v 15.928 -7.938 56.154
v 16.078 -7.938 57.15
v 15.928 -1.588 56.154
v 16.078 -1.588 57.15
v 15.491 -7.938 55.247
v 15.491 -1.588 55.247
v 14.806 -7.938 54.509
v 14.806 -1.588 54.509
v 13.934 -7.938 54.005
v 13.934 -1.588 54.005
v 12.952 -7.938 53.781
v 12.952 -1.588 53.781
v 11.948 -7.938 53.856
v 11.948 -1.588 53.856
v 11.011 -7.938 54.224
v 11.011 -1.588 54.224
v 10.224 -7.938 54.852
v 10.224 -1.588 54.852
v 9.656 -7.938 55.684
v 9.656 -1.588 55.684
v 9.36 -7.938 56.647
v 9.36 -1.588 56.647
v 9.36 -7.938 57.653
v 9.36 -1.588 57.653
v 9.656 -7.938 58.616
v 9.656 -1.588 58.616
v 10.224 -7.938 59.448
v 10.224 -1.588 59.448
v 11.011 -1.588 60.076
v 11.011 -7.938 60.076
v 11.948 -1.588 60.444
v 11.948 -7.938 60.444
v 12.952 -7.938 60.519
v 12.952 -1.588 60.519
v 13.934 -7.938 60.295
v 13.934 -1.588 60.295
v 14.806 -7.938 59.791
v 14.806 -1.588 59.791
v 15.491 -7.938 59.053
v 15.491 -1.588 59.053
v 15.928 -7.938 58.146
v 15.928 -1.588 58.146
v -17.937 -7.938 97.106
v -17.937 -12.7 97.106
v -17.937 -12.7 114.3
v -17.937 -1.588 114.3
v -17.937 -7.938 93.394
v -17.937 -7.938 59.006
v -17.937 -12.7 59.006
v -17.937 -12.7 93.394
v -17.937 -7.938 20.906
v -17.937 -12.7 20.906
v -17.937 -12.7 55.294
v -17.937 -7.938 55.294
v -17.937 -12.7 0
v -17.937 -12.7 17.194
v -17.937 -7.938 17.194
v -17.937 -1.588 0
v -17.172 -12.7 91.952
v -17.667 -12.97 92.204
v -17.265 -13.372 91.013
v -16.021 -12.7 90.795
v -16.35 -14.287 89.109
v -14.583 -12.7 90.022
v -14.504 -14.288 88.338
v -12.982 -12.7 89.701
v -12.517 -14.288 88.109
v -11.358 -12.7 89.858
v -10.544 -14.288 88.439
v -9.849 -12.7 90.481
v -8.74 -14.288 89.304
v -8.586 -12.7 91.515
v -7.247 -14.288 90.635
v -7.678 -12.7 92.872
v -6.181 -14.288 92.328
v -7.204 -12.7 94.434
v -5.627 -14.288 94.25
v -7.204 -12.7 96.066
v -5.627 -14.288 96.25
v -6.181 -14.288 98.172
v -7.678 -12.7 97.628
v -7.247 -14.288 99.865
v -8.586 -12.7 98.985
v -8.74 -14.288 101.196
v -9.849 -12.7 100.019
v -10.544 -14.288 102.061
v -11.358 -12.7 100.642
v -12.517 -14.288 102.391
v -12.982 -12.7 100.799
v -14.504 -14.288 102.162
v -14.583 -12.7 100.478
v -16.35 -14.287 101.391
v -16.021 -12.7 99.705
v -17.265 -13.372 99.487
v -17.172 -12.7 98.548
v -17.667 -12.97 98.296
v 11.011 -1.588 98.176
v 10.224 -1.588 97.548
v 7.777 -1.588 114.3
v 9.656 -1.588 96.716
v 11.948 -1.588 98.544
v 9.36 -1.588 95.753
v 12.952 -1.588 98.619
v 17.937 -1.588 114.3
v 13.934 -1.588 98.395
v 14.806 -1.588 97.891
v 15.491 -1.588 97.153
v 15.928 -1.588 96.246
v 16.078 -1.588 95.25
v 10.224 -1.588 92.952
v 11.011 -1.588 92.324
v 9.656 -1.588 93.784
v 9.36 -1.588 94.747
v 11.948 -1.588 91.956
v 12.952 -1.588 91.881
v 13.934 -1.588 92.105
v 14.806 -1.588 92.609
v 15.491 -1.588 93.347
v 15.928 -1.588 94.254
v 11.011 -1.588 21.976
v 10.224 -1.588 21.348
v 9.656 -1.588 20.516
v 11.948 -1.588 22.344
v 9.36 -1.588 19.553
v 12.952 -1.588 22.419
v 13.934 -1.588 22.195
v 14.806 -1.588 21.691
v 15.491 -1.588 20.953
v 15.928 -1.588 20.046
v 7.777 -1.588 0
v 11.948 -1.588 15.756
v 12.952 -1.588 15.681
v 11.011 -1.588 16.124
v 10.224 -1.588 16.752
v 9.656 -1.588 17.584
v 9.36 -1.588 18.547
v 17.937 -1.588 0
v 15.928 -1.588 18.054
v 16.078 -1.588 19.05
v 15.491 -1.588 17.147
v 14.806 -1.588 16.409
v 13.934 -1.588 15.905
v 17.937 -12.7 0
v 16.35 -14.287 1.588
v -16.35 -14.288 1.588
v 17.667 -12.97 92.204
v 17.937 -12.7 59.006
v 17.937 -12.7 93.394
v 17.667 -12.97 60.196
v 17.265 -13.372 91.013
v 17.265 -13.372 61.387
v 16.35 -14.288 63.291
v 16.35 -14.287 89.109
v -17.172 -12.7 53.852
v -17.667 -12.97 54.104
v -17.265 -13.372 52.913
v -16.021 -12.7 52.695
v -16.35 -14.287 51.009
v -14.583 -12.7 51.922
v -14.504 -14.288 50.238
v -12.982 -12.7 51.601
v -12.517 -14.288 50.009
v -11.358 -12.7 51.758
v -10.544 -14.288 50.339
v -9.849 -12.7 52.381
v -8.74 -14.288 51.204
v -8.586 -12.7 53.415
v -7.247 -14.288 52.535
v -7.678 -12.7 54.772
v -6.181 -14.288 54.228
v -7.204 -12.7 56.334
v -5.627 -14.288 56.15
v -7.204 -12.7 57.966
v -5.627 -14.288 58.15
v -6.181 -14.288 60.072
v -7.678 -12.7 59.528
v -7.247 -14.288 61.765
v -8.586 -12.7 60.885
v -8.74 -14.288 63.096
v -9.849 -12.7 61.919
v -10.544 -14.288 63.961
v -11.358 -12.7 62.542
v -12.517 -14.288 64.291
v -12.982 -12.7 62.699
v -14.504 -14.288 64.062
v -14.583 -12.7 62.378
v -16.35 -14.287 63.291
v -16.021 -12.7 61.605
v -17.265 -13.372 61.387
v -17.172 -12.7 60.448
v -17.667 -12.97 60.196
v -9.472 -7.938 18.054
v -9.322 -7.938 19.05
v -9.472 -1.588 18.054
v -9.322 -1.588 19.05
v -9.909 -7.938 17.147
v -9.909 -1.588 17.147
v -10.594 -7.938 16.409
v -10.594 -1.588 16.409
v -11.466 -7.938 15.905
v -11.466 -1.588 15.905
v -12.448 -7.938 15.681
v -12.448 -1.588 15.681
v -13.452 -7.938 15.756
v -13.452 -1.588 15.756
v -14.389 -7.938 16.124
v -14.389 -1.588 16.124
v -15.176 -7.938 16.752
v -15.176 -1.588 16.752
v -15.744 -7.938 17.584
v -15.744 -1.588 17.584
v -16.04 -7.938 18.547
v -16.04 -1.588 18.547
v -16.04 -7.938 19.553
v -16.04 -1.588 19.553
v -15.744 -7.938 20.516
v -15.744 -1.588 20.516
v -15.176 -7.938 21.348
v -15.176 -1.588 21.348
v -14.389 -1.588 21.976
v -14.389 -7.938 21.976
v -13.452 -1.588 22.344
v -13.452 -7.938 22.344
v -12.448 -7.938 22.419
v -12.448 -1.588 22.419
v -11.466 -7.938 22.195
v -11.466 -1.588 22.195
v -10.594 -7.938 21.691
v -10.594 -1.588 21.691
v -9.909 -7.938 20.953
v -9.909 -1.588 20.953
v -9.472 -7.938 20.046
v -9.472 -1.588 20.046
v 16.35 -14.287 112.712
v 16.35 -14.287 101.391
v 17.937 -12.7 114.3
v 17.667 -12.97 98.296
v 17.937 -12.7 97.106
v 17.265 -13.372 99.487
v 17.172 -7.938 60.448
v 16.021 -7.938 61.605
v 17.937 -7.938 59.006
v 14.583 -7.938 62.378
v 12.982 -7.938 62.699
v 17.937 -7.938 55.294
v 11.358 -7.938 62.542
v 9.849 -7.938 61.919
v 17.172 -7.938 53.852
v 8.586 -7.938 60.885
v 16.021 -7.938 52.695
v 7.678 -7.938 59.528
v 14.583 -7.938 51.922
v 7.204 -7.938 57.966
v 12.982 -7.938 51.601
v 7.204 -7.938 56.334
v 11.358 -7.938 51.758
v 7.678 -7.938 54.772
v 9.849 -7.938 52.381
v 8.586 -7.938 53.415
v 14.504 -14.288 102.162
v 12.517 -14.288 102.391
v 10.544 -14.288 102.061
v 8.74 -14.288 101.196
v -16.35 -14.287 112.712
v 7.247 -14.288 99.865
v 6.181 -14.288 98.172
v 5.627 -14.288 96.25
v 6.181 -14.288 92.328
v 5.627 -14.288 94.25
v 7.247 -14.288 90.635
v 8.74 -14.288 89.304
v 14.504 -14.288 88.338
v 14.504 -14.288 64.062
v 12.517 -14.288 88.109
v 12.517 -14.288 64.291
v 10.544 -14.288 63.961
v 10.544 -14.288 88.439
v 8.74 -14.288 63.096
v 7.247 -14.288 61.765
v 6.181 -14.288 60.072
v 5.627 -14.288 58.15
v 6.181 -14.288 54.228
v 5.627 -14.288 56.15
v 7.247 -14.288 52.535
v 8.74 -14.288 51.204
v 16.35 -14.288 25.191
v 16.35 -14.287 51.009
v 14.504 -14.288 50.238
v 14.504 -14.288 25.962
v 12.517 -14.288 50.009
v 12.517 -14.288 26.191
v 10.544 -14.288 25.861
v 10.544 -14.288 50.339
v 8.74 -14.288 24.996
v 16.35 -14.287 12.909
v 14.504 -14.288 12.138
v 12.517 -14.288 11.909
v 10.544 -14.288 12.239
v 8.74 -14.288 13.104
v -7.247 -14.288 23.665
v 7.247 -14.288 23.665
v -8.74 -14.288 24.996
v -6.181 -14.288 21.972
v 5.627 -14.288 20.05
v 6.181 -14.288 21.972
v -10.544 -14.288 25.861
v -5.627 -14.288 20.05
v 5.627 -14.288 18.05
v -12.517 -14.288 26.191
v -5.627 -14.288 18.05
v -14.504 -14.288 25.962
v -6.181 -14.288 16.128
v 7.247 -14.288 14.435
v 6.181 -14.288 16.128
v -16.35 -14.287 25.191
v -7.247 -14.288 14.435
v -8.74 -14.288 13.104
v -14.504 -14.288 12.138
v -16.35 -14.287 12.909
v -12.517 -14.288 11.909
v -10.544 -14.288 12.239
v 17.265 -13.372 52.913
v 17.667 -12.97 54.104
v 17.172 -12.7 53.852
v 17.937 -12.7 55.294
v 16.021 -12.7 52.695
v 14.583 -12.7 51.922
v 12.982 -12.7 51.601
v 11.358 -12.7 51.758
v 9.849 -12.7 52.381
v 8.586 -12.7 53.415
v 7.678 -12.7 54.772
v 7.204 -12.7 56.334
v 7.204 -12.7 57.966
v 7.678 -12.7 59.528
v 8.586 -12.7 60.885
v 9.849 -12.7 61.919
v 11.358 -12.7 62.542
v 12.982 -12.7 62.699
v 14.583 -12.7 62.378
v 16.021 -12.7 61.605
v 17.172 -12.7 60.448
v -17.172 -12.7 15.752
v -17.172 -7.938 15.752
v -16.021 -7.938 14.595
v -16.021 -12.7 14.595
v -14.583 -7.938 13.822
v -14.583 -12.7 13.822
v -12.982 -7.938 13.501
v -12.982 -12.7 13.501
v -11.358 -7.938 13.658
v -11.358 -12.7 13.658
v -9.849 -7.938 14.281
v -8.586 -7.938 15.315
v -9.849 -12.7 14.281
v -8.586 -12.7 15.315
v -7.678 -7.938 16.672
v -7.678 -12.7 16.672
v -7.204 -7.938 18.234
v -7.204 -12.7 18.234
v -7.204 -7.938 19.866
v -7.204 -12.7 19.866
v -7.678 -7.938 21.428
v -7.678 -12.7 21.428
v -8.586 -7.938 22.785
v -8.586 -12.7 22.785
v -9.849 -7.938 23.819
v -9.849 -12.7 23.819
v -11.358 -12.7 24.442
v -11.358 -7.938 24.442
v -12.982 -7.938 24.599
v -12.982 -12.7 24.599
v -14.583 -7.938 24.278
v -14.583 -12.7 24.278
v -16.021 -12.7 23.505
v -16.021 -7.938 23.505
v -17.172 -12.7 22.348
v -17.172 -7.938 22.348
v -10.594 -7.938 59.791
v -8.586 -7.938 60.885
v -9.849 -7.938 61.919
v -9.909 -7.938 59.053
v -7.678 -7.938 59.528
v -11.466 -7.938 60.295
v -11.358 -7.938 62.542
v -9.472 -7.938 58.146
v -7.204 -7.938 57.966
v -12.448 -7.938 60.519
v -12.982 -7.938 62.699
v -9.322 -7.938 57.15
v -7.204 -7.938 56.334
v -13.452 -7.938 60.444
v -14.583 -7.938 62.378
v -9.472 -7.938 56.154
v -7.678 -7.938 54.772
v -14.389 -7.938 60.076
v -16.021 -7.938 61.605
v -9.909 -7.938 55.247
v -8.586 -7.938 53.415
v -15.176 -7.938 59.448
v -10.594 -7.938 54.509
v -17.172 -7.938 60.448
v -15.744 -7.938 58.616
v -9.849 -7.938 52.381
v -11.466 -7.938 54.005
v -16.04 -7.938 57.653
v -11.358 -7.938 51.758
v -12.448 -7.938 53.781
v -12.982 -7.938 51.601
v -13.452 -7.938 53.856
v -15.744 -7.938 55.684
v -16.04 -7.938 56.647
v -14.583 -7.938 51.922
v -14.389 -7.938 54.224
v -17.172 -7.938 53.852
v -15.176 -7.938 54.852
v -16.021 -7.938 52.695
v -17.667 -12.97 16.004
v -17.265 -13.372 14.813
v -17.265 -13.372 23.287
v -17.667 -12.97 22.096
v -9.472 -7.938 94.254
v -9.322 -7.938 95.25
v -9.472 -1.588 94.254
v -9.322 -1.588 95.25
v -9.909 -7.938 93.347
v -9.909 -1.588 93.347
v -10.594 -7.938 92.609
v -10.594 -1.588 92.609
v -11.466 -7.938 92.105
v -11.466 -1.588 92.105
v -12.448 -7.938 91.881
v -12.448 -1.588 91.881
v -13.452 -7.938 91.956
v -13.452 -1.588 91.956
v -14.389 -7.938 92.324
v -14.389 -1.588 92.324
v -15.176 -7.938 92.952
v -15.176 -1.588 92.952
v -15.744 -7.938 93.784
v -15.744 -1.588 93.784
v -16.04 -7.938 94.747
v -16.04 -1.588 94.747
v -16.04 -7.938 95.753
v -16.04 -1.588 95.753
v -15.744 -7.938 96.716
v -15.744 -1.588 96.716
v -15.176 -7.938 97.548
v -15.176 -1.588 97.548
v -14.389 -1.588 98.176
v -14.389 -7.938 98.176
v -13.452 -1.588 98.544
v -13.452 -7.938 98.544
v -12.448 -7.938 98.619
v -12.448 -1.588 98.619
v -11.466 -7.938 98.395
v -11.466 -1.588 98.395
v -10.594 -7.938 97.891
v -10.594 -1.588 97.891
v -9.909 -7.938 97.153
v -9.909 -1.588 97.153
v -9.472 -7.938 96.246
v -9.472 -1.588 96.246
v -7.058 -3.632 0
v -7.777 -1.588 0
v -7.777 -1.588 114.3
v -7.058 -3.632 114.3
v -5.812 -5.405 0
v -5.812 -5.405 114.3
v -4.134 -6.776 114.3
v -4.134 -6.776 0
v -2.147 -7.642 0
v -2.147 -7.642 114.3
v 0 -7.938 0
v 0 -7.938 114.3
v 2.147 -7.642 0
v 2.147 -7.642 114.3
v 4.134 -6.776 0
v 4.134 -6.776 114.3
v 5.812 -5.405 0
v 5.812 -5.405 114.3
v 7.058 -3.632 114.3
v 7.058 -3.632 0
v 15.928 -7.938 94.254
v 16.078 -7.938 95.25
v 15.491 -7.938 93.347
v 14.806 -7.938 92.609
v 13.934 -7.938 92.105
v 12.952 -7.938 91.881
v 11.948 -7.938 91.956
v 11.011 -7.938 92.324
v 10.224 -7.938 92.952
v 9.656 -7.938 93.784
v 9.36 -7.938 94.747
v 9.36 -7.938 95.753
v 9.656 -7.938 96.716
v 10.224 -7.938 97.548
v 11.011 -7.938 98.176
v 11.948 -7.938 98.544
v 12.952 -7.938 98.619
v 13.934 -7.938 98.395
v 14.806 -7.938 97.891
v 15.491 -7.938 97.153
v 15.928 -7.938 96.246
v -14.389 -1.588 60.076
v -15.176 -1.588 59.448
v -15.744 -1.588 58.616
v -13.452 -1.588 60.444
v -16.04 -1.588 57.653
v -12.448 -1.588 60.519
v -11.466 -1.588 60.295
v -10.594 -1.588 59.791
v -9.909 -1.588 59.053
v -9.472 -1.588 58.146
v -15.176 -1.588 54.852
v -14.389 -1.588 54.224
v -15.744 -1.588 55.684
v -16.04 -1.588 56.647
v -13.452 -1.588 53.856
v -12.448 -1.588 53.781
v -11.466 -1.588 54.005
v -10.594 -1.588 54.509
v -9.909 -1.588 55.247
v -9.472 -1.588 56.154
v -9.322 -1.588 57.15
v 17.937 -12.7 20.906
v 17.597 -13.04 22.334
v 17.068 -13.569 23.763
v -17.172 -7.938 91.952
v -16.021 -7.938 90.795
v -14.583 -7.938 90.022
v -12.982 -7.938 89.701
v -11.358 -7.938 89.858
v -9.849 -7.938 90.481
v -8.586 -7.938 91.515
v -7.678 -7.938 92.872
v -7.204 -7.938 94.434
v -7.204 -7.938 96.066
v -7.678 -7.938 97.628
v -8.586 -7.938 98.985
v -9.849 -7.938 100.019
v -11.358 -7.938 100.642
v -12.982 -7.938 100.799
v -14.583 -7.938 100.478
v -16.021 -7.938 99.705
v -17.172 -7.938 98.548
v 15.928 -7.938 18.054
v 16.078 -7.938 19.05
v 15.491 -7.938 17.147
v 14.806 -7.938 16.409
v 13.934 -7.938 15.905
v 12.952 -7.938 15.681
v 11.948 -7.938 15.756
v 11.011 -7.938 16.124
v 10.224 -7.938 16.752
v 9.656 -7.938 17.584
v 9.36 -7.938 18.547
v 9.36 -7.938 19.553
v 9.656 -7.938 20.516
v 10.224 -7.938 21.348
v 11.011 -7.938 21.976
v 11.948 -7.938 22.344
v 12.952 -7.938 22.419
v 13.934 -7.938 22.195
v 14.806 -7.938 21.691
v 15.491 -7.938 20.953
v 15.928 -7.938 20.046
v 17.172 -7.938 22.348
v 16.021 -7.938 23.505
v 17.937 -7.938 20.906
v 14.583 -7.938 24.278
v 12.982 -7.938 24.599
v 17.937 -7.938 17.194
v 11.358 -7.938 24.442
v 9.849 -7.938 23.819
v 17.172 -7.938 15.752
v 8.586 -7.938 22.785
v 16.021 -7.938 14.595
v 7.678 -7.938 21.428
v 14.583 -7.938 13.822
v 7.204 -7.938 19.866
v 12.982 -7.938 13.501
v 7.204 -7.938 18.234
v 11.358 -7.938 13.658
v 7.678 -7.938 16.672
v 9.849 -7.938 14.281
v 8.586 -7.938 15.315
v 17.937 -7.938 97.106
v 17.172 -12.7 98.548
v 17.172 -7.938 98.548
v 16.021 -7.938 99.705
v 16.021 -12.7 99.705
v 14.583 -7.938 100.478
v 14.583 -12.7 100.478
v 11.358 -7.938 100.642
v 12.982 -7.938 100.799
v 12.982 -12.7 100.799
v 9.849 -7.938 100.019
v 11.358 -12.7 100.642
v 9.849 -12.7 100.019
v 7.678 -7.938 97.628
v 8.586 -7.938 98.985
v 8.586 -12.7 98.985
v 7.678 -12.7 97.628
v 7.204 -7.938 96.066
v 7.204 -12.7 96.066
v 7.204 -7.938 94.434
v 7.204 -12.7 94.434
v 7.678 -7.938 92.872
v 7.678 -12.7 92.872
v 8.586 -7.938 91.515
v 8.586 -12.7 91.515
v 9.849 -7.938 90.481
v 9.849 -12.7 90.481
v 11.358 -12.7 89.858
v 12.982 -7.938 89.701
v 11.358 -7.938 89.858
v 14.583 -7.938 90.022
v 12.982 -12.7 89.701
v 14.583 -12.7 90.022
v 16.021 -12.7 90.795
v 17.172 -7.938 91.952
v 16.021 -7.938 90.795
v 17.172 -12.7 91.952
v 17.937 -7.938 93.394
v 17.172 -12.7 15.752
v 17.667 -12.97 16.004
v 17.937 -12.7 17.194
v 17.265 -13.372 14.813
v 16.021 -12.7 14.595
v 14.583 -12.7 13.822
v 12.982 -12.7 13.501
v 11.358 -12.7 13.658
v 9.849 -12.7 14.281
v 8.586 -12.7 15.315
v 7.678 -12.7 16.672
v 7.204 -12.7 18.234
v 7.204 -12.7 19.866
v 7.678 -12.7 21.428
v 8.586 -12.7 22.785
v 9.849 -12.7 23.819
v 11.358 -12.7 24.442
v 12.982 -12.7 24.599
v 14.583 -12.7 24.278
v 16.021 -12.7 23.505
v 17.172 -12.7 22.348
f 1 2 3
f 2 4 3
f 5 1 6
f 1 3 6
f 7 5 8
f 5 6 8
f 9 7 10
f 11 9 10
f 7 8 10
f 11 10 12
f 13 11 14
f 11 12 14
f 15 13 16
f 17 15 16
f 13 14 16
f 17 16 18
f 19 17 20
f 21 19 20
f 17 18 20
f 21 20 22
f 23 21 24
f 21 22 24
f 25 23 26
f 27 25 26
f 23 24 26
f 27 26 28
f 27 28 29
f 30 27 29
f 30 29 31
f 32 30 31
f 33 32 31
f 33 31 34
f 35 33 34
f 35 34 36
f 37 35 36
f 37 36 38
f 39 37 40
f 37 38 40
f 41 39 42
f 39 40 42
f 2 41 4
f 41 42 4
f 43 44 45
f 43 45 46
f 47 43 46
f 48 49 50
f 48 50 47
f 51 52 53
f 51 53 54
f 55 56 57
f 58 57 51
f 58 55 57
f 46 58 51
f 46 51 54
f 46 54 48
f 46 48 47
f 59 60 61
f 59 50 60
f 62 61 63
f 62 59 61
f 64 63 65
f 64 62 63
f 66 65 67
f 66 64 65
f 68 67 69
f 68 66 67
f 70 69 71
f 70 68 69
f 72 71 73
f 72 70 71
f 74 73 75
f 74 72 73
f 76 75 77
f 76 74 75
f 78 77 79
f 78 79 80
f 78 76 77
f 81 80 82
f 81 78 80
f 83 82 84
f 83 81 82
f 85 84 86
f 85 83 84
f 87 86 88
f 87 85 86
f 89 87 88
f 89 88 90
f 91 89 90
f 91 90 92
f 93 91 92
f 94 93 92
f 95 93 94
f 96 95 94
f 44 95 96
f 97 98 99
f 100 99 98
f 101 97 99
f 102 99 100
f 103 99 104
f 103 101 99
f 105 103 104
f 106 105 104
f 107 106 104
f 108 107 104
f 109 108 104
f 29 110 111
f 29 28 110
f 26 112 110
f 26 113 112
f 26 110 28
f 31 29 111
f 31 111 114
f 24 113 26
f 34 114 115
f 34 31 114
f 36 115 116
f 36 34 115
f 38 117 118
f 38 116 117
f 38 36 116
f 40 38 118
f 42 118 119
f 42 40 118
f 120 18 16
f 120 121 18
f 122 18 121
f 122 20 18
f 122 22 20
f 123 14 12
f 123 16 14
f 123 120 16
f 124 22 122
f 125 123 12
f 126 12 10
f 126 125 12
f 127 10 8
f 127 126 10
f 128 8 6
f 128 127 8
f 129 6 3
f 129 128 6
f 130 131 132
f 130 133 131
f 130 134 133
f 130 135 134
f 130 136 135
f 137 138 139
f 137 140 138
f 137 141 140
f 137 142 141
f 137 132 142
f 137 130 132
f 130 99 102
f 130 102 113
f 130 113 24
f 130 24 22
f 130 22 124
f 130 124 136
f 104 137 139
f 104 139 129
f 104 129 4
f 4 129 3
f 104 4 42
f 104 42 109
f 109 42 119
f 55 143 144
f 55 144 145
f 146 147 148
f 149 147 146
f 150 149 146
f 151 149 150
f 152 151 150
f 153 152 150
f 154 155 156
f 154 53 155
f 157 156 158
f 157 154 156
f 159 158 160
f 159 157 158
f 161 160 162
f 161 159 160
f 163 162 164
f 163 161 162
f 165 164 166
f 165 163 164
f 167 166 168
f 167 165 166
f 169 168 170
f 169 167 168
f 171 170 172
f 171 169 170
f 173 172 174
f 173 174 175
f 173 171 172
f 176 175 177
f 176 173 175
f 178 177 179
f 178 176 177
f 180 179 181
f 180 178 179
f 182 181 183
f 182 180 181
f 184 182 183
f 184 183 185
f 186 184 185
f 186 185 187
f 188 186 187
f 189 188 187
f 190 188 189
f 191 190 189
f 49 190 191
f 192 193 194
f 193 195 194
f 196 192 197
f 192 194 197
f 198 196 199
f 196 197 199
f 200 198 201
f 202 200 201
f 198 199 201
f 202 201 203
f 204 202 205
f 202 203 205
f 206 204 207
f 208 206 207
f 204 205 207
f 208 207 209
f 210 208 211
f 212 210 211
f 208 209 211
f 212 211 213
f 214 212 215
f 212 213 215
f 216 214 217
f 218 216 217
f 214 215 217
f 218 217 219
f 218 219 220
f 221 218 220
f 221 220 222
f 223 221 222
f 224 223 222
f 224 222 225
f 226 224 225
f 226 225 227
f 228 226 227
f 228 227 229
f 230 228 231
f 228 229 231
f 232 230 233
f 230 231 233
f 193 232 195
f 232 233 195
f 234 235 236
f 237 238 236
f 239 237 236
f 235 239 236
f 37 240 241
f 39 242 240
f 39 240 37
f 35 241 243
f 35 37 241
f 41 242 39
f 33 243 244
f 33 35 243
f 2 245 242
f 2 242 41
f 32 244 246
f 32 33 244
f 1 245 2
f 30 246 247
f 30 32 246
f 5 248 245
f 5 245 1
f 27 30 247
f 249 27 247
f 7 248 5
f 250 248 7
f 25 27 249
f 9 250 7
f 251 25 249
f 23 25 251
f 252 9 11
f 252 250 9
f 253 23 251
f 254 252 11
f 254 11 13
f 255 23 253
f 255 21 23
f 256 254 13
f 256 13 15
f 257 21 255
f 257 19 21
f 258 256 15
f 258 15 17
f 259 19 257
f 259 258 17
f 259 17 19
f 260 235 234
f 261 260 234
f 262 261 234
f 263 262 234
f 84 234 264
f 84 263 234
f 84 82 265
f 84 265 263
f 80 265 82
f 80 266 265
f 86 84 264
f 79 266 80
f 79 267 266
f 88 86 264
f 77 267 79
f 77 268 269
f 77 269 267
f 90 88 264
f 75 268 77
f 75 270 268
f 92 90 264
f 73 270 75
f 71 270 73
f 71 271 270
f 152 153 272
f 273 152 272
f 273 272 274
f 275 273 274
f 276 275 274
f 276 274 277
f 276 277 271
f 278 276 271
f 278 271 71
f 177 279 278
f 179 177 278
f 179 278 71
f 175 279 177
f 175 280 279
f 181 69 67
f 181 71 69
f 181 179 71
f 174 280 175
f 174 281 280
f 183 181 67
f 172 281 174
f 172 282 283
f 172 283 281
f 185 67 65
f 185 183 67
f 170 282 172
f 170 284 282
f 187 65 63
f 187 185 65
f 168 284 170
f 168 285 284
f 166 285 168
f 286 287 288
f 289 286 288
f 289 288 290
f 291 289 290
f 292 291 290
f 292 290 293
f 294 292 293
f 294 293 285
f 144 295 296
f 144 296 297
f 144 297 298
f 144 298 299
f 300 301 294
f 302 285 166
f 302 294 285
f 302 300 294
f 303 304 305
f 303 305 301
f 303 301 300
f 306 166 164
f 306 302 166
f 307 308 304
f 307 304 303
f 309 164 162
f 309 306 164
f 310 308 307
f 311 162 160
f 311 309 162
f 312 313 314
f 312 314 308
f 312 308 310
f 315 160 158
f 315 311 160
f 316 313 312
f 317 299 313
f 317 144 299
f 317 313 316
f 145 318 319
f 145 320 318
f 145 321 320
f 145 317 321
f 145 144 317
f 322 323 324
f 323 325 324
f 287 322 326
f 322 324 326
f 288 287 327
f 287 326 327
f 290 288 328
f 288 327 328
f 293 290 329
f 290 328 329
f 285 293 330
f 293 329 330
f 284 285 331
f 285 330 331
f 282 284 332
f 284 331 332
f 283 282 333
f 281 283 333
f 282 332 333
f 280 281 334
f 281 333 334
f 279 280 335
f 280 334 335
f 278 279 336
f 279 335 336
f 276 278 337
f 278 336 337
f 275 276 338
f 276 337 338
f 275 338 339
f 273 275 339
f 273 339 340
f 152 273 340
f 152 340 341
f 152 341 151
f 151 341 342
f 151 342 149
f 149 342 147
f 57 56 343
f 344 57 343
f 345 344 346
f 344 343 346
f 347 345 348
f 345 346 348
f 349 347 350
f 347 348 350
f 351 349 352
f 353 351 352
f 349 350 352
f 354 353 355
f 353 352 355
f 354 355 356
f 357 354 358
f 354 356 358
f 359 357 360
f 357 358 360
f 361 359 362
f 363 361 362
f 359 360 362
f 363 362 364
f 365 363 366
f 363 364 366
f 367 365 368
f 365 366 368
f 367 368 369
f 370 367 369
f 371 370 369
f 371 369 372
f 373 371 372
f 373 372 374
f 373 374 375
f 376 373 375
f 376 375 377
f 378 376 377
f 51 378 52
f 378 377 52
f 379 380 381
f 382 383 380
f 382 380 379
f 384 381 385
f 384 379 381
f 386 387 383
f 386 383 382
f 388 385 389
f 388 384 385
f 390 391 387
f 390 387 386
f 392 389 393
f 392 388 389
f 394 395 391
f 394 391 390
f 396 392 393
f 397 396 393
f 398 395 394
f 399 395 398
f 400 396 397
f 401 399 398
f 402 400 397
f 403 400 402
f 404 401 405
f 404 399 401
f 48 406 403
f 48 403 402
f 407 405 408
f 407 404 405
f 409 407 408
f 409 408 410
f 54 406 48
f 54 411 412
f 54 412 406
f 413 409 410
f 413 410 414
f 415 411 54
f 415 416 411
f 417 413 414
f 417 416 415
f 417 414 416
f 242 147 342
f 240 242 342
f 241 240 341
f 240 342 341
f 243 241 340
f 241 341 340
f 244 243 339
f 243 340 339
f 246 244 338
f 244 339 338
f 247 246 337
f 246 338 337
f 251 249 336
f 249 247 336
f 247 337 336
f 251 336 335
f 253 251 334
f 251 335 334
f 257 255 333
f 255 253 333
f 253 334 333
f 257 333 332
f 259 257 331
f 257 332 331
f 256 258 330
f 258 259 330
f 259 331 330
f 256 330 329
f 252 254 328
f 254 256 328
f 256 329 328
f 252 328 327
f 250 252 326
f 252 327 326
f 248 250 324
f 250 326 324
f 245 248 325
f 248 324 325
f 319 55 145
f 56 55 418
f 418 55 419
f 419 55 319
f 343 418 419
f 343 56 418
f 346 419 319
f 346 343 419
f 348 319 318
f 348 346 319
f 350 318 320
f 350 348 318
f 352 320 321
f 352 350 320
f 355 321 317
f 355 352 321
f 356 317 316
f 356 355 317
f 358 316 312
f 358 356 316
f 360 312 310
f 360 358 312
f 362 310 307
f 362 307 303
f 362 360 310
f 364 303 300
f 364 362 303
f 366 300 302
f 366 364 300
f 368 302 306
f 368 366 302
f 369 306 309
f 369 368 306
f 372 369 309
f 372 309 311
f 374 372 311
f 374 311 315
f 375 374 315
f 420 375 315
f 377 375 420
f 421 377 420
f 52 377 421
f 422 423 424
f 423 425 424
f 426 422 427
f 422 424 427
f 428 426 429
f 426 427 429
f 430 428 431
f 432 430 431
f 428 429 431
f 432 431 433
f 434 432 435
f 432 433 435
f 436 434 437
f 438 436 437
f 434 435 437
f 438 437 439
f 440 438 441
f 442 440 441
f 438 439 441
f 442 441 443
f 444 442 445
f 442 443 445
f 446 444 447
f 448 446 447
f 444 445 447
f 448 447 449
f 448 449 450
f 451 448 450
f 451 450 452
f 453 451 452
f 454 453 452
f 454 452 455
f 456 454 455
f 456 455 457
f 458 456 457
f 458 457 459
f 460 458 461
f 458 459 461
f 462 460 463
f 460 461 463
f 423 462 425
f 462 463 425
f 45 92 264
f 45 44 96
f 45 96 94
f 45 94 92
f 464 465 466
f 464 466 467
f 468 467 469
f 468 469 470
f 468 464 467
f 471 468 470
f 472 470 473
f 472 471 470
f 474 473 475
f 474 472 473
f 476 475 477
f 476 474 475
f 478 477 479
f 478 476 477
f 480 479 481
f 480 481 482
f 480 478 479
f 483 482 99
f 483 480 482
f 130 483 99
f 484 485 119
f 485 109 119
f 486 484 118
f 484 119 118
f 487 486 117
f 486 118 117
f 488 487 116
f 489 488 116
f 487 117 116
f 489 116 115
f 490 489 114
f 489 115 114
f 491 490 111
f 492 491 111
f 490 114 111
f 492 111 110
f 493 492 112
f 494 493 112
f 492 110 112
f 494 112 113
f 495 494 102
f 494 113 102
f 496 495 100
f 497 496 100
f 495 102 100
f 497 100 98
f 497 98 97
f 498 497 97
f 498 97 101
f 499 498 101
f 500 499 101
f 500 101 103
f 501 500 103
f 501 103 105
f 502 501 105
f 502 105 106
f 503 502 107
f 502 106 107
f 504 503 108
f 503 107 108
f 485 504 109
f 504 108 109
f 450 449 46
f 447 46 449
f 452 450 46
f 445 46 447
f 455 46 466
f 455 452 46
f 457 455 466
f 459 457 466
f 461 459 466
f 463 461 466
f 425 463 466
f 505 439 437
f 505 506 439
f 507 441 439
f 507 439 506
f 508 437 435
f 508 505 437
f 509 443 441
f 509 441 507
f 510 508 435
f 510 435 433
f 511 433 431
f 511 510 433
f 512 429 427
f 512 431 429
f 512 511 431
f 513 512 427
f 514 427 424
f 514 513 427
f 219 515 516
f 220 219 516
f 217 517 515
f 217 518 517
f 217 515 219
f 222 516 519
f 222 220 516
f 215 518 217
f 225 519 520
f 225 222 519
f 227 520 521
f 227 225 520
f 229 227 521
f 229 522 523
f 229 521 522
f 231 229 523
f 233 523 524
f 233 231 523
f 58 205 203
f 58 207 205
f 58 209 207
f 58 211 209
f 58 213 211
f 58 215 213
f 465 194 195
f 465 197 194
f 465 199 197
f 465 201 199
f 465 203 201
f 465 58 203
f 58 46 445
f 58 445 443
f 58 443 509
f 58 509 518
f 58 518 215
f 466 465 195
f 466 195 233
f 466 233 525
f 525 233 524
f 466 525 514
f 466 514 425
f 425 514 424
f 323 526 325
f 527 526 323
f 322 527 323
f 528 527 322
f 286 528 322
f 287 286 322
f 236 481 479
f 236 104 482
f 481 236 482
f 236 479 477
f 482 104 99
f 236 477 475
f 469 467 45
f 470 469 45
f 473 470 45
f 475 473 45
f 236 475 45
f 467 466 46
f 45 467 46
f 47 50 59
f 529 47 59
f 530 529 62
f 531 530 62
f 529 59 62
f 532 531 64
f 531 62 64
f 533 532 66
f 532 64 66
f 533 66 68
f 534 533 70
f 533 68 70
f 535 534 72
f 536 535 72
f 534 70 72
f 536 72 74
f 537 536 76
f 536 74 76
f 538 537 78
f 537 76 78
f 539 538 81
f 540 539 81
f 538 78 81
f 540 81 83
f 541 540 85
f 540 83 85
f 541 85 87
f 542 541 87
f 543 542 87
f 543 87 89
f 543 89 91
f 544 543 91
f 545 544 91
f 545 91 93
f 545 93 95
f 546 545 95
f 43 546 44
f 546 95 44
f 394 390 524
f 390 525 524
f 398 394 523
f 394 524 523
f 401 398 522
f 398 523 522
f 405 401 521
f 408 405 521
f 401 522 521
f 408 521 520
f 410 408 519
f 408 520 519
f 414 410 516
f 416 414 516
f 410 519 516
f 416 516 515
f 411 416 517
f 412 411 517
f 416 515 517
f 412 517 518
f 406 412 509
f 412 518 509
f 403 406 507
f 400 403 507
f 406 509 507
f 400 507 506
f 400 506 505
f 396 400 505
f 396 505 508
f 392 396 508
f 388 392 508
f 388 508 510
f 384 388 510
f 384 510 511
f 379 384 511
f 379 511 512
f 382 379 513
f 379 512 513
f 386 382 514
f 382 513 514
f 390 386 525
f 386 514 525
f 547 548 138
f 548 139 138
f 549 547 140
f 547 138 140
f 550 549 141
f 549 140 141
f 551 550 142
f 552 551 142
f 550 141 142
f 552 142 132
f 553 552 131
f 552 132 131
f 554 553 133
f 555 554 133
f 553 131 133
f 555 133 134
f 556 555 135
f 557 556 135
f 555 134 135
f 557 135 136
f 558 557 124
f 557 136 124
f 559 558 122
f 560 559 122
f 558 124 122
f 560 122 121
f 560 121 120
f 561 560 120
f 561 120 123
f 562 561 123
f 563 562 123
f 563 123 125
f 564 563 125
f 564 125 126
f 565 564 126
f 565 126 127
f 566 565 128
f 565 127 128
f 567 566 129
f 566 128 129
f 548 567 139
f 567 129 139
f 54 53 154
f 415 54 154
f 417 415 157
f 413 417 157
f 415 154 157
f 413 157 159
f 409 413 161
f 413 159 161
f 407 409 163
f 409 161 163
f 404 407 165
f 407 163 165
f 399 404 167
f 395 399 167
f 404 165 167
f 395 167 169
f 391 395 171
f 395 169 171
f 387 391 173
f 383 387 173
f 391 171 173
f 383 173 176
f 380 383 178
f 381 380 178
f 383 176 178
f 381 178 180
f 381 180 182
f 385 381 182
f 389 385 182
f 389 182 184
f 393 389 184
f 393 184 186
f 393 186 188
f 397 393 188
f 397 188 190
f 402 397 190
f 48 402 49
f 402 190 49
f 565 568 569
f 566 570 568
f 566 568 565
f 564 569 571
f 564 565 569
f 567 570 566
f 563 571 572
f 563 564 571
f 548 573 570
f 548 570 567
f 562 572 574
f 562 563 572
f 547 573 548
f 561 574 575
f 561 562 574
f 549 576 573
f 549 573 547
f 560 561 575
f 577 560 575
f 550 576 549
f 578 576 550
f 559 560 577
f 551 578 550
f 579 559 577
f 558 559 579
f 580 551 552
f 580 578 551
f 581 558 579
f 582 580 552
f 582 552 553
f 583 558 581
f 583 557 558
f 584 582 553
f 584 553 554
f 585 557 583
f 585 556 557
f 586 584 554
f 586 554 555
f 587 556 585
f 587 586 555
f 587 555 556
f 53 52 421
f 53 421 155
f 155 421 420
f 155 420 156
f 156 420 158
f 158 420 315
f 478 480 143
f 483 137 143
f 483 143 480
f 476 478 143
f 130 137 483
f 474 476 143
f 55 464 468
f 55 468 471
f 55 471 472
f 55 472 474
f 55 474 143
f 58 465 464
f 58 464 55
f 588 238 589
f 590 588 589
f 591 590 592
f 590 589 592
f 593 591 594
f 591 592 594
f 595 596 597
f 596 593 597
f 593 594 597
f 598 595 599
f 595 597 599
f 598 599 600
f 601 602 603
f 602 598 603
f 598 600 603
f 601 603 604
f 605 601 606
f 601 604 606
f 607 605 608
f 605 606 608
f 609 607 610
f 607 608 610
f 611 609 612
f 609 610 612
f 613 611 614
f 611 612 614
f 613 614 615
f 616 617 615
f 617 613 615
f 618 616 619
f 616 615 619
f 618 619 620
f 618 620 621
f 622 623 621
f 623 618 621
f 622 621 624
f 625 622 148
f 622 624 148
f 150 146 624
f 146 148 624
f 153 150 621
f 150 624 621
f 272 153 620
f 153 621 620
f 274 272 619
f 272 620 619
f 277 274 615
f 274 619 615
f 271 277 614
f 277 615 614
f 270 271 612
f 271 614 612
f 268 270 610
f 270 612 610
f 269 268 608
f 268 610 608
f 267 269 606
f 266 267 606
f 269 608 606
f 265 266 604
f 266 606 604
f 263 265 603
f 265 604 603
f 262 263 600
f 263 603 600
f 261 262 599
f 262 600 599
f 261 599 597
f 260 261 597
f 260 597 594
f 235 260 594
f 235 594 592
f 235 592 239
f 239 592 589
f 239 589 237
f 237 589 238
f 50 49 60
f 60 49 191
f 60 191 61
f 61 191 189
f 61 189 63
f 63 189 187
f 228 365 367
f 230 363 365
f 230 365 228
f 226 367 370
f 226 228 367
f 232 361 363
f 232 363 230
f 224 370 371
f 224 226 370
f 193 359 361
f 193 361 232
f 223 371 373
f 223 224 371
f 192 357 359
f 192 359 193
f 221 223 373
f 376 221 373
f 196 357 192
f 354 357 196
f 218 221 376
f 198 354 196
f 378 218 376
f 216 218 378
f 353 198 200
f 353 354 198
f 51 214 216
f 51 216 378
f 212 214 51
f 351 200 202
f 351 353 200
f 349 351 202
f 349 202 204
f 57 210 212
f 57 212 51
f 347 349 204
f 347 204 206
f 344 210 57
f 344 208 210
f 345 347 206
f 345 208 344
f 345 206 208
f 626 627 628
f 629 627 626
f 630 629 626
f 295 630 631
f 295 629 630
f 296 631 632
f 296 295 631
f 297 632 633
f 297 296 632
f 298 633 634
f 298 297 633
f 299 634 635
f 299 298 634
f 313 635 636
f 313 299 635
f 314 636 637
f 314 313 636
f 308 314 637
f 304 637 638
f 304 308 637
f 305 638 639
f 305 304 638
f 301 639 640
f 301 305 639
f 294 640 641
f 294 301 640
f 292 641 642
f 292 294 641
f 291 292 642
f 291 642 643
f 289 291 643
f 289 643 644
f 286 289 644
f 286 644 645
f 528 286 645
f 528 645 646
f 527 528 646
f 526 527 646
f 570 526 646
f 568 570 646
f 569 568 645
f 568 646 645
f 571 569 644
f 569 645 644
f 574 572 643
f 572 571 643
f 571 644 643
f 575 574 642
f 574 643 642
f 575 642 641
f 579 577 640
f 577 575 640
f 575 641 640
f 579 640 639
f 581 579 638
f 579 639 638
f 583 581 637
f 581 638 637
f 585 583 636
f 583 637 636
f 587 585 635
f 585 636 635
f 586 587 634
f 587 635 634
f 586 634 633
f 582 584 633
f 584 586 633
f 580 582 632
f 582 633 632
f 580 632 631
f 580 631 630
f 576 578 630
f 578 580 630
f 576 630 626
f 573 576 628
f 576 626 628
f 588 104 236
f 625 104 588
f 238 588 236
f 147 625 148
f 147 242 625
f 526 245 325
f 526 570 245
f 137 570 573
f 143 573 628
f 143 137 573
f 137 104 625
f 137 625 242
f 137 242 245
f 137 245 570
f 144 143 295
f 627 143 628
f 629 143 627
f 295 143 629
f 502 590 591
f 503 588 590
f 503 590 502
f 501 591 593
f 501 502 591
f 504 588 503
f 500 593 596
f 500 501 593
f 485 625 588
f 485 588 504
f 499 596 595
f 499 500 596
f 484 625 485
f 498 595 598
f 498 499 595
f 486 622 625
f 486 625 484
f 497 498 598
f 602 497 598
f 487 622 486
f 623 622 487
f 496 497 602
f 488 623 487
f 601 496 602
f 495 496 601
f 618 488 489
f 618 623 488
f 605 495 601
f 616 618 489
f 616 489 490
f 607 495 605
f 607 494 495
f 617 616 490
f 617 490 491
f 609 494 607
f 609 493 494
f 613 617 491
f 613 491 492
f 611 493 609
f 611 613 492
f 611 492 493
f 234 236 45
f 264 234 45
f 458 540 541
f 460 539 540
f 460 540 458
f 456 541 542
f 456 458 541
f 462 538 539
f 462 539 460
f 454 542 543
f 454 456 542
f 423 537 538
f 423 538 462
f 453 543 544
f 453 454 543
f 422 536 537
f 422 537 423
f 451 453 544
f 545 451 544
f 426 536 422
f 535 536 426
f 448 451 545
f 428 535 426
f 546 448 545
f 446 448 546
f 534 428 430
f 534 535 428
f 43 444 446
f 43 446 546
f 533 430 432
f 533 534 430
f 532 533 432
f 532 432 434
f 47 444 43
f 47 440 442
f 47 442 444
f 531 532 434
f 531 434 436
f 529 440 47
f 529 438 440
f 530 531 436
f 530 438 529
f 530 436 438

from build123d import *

# Parameters (mm, degrees)
STOCK_DEPTH                                      = 114.3
CBORE_FOR_1_4_SOCKET_HEAD_CAP_SCREW1_D           = 6.7564
CBORE_FOR_1_4_SOCKET_HEAD_CAP_SCREW1_CBORE_D     = 11.1125
CBORE_FOR_1_4_SOCKET_HEAD_CAP_SCREW1_CBORE_DEPTH = 6.35
CHAMFER1_SIZE                                    = 1.5875


with BuildPart() as part:
    # Sketch1 → stock (new body)
    with BuildSketch(Plane.XY):
        with BuildLine():
            Line((7.777129933, -1.5875), (17.937129933, -1.5875))
            Line((17.937129933, -1.5875), (17.937129933, -14.2875))
            Line((17.937129933, -14.2875), (-17.937129933, -14.2875))
            Line((-17.937129933, -14.2875), (-17.937129933, -1.5875))
            Line((-17.937129933, -1.5875), (-7.777129933, -1.5875))
            ThreePointArc((-7.777129933, -1.5875), (0, -7.9375), (7.777129933, -1.5875))
        make_face()
    extrude(amount=STOCK_DEPTH)

    # CBORE for 1/4 Socket Head Cap Screw1 (through all)
    with Locations(Plane(origin=(0, -14.2875, 0), x_dir=(-1, 0, 0), z_dir=(0, -1, 0))):
        with Locations((12.7, -19.05), (12.7, -57.15), (12.7, -95.25), (-12.7, -95.25), (-12.7, -57.15), (-12.7, -19.05)):
            CounterBoreHole(CBORE_FOR_1_4_SOCKET_HEAD_CAP_SCREW1_D / 2, CBORE_FOR_1_4_SOCKET_HEAD_CAP_SCREW1_CBORE_D / 2, CBORE_FOR_1_4_SOCKET_HEAD_CAP_SCREW1_CBORE_DEPTH)

    # Chamfer1
    chamfer1_edges = [part.edges().sort_by_distance(p)[0] for p in [
        (17.937129933, -14.2875, 105.702952602),
        (-17.937129933, -14.2875, 105.702952602),
        (17.937129933, -14.2875, 8.597047398),
        (7.14375, -14.2875, 19.05),
        (17.937129933, -14.2875, 38.1),
        (7.14375, -14.2875, 57.15),
        (0, -14.2875, 114.3),
        (17.937129933, -14.2875, 76.2),
        (7.14375, -14.2875, 95.25),
        (-17.937129933, -14.2875, 76.2),
        (-7.14375, -14.2875, 95.25),
        (-17.937129933, -14.2875, 38.1),
        (-7.14375, -14.2875, 57.15),
        (0, -14.2875, 0),
        (-17.937129933, -14.2875, 8.597047398),
        (-7.14375, -14.2875, 19.05),
    ]]
    chamfer(chamfer1_edges, length=CHAMFER1_SIZE)


solid = part.part
